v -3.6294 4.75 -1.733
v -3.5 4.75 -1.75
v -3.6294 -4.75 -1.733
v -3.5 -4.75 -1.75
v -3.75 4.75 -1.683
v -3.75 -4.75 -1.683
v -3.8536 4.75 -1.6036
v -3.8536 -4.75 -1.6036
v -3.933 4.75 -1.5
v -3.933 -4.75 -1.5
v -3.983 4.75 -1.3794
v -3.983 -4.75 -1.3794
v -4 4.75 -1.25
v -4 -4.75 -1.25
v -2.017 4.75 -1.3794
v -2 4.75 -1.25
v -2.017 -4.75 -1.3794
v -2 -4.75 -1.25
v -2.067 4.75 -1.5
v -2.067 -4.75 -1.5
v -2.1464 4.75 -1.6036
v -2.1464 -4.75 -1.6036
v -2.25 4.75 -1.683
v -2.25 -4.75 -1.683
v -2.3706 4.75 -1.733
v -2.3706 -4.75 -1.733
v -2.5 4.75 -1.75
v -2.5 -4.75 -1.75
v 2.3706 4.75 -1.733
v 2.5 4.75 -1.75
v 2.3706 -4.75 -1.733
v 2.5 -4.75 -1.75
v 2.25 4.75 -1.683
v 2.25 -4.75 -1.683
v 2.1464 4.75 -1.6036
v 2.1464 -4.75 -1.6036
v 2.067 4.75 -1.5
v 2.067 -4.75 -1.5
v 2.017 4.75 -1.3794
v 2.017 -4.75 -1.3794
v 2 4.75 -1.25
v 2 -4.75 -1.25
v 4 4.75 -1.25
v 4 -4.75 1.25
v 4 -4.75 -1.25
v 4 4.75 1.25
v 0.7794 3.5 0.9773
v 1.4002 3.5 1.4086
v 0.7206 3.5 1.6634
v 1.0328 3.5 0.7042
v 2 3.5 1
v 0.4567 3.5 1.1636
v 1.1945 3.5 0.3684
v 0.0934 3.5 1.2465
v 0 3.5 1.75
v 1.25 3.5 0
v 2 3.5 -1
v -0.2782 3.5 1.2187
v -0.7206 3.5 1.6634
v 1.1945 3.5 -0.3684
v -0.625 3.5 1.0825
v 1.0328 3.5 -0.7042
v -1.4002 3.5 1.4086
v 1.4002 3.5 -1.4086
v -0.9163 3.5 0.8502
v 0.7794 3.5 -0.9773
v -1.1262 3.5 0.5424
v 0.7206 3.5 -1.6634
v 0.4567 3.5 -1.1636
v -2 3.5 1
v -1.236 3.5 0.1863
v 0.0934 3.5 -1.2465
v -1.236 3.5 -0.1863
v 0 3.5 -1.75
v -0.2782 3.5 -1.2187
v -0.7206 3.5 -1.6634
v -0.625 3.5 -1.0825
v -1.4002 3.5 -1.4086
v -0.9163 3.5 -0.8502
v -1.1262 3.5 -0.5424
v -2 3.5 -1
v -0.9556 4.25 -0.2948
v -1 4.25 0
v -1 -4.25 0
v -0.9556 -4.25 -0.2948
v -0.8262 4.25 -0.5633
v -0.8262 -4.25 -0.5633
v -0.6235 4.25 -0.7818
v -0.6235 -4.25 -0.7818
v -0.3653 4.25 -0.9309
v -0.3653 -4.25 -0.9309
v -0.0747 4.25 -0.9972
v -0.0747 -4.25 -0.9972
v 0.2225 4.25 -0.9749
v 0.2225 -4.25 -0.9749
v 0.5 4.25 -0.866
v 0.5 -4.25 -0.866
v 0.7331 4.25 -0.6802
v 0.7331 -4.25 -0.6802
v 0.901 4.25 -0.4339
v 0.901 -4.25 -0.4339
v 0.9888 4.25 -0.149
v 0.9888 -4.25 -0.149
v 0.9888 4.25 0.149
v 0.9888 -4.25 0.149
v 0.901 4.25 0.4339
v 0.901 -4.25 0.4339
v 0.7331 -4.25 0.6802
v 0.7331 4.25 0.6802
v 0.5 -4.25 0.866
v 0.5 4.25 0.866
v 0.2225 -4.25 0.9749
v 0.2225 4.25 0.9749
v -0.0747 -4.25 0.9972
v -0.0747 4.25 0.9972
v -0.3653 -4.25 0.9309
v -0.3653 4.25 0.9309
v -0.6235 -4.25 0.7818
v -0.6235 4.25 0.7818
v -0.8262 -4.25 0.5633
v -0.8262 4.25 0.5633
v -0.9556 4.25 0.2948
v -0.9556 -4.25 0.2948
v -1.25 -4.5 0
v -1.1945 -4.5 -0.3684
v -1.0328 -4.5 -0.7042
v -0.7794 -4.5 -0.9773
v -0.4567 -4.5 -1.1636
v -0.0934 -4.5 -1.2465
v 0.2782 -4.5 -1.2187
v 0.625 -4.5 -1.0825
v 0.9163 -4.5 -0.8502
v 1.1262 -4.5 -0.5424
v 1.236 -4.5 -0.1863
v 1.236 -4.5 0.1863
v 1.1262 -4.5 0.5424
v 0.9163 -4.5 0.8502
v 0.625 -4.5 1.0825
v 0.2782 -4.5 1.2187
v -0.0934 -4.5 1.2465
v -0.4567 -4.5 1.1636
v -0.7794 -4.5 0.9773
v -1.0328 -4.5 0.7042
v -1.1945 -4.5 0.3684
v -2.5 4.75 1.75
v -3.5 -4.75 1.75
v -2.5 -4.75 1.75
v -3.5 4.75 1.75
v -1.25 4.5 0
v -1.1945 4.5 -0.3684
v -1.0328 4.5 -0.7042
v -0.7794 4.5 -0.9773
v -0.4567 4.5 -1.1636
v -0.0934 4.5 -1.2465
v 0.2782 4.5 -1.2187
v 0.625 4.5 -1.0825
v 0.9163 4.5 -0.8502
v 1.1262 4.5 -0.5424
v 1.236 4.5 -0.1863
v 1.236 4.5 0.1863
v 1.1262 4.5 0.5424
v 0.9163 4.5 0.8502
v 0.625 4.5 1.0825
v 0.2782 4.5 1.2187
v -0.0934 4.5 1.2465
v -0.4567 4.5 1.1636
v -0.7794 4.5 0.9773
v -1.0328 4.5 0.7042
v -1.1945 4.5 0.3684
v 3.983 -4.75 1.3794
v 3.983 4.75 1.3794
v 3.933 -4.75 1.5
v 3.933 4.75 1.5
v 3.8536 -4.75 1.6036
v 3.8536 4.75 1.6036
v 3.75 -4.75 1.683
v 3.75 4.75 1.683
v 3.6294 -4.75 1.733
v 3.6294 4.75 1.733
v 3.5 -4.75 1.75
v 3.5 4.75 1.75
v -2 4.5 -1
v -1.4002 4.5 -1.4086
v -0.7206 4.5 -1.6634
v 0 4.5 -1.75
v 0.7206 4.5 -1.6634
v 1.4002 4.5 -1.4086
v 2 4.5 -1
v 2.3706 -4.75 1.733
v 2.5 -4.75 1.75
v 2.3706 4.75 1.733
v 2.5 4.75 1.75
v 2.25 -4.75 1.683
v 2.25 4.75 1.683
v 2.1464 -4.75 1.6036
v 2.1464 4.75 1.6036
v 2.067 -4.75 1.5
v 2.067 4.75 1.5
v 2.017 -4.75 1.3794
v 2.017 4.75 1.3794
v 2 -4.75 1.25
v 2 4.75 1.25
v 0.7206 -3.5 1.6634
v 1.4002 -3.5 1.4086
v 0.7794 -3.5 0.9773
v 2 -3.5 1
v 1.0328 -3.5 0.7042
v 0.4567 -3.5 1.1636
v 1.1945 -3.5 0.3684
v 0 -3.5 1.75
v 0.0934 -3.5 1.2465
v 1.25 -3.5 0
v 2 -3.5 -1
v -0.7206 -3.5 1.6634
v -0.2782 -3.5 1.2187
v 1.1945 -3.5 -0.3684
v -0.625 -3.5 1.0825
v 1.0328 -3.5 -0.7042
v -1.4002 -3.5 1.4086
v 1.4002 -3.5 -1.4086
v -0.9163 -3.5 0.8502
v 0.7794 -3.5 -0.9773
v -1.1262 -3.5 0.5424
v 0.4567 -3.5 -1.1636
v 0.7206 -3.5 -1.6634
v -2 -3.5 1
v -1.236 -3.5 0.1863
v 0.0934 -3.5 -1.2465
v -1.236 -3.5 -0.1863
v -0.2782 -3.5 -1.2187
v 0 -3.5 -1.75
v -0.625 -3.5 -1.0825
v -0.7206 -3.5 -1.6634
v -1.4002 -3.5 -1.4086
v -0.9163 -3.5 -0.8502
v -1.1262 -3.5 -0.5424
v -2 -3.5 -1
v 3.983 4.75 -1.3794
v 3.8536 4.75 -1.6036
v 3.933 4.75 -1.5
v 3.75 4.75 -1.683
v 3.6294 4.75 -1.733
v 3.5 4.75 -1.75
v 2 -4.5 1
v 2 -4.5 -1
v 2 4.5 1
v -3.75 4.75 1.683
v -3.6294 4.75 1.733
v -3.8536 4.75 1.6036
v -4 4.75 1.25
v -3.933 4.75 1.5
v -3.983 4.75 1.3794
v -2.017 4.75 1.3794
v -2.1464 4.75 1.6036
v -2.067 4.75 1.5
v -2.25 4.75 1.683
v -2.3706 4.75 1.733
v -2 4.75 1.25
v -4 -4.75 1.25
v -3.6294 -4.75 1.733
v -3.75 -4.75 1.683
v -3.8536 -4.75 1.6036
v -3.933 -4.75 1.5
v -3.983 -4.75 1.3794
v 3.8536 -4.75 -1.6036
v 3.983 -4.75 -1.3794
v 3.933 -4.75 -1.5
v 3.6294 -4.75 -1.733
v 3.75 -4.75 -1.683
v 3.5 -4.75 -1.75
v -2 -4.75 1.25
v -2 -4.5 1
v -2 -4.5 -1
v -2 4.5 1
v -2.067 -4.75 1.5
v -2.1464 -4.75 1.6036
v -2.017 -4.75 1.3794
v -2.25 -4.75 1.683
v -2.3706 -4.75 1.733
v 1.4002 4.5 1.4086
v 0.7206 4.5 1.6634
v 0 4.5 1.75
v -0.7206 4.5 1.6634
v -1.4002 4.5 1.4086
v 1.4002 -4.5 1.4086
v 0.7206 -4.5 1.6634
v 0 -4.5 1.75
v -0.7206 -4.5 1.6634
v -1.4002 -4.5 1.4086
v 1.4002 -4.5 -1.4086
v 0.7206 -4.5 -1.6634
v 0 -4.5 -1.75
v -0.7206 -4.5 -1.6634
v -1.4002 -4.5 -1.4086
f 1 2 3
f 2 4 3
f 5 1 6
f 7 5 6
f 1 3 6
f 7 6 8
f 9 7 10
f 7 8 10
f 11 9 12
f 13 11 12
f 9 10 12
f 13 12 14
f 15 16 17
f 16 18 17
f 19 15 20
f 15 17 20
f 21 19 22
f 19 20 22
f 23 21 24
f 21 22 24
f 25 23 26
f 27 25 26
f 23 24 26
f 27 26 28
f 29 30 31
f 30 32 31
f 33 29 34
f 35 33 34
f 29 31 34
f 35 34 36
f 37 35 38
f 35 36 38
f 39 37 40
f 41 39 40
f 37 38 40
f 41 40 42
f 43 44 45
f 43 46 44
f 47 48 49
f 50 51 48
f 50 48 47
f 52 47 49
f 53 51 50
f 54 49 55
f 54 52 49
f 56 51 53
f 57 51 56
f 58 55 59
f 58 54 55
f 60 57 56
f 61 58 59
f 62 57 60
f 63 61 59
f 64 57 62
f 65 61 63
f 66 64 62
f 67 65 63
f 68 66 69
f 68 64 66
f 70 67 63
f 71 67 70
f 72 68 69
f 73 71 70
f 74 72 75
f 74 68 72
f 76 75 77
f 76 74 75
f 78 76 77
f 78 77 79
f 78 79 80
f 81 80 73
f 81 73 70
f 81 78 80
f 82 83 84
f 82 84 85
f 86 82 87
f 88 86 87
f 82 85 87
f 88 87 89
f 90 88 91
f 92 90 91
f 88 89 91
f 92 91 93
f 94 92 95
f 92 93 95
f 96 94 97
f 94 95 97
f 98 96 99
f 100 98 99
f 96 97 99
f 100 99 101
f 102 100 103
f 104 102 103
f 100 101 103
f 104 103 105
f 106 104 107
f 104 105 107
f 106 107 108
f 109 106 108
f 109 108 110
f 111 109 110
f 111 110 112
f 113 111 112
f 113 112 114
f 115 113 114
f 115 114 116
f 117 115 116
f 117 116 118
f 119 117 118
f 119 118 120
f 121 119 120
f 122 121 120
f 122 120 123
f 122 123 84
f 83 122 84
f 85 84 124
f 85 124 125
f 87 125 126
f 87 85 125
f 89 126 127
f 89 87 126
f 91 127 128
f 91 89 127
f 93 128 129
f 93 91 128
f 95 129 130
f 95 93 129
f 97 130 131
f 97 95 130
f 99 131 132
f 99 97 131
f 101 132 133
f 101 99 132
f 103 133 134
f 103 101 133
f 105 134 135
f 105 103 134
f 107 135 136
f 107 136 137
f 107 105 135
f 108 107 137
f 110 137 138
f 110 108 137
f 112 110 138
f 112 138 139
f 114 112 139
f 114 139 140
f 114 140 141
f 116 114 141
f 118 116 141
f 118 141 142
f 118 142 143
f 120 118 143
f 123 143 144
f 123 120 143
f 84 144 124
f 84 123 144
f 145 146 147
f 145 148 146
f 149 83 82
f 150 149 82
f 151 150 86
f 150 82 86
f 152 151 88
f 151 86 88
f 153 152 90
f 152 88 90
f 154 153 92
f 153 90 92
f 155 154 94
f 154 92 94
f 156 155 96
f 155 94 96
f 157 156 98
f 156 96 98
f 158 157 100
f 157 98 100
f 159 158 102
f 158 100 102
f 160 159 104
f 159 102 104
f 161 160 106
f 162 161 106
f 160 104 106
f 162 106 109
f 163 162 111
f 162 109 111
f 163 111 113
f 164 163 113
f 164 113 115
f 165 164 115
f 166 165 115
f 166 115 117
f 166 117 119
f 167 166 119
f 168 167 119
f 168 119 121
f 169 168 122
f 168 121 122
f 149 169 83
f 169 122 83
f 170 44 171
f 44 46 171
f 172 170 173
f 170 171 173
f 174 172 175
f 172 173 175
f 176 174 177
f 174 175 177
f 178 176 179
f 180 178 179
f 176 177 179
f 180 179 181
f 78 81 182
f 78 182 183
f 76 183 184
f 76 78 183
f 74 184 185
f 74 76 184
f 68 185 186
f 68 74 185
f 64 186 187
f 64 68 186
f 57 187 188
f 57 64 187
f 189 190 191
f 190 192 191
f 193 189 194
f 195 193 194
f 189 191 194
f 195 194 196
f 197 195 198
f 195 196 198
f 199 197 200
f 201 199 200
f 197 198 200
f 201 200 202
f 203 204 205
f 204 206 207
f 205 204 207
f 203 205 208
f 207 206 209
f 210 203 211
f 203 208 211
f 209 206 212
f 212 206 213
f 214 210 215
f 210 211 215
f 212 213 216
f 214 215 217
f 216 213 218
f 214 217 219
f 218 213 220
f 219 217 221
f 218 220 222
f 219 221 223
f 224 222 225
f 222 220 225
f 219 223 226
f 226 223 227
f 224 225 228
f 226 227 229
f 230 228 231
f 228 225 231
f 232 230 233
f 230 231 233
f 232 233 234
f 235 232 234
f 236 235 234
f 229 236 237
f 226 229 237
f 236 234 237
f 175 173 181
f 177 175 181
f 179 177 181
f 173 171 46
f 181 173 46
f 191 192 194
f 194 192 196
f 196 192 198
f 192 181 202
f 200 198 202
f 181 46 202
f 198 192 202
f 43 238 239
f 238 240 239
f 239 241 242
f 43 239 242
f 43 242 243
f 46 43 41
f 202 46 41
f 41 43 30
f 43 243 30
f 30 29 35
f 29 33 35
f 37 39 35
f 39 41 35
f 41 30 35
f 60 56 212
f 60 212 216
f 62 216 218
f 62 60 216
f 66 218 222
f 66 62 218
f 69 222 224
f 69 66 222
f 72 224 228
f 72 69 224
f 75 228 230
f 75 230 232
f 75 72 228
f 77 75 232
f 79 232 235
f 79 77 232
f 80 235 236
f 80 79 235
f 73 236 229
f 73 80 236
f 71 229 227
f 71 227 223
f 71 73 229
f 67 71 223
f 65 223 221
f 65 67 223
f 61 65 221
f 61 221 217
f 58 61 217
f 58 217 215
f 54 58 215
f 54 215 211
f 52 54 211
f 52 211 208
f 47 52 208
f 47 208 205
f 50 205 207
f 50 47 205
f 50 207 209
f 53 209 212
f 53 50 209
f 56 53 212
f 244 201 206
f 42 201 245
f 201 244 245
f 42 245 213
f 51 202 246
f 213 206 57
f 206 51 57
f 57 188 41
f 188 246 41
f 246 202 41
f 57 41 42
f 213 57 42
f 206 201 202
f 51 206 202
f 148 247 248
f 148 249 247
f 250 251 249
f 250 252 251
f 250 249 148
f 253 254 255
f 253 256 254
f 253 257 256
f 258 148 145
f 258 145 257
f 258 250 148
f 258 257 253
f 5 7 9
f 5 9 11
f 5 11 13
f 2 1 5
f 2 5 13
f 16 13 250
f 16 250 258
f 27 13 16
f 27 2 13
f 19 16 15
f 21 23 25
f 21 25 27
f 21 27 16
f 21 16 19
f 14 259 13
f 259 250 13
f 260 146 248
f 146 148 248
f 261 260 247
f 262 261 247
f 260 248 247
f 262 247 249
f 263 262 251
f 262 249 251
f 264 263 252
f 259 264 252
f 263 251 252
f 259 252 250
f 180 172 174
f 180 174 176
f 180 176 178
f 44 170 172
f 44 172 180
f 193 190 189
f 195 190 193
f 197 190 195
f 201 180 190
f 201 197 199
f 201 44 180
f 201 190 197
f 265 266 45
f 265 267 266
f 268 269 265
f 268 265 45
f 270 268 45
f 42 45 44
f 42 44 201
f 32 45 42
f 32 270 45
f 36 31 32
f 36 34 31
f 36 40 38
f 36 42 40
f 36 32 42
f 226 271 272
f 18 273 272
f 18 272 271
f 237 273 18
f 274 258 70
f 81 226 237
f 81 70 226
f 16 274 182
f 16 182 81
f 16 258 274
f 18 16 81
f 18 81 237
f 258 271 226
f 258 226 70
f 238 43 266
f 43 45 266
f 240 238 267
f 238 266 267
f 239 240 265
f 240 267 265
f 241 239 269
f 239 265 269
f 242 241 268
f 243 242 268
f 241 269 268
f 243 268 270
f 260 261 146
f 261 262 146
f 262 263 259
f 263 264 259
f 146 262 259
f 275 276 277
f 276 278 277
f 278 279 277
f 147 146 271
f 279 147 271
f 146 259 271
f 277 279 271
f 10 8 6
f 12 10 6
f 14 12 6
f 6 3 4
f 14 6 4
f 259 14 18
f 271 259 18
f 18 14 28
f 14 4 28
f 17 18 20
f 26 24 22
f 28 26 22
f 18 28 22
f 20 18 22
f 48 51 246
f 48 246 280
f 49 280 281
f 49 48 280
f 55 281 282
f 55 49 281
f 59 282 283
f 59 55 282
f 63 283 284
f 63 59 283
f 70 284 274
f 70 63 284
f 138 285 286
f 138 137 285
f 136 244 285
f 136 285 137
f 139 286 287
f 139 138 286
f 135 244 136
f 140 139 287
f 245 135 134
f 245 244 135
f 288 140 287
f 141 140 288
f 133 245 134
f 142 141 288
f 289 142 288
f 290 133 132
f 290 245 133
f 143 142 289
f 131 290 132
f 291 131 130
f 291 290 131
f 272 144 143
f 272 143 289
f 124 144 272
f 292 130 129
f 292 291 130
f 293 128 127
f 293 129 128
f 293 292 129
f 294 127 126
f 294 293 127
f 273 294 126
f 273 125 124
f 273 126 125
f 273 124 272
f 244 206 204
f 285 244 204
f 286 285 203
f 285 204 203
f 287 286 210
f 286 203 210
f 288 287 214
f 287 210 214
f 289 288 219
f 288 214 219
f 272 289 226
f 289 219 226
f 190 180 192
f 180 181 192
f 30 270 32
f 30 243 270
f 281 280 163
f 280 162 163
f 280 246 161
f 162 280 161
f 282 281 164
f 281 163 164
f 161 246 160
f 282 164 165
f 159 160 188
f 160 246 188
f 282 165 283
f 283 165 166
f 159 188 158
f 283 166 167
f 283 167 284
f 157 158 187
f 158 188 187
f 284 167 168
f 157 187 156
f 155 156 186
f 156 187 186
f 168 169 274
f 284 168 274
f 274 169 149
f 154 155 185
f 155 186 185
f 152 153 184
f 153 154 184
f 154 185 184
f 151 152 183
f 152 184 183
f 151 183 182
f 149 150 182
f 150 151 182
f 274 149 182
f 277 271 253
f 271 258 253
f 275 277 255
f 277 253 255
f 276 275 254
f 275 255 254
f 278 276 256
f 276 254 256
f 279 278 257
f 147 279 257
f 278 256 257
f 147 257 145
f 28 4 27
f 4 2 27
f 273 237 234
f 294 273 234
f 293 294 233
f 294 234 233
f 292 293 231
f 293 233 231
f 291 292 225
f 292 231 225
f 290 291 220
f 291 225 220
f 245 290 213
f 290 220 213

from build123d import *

# Parameters (mm, degrees)
SKETCH1_R             = 1.25
BOSS_EXTRUDE1_DEPTH   = 4.5
BOSS_EXTRUDE2_START   = -3.5
BOSS_EXTRUDE2_DEPTH   = 1
SKETCH3_W             = 2
SKETCH3_H             = 3.5
BOSS_EXTRUDE3_DEPTH   = 4.75
FILLET2_R             = 0.5
F_2_0MM_DOWEL_HOLE1_D = 2
CHAMFER1_SIZE         = 0.25


with BuildPart() as part:
    # Sketch1 → Boss-Extrude1 (new body, symmetric)
    with BuildSketch(Plane(origin=(0, 0, 0), x_dir=(1, 0, 0), z_dir=(0, 1, 0))):
        Circle(SKETCH1_R)
    extrude(amount=BOSS_EXTRUDE1_DEPTH, both=True)

    # Sketch2 → Boss-Extrude2 (add)
    with BuildSketch(Plane(origin=(0, 0, 0), x_dir=(1, 0, 0), z_dir=(0, 1, 0)).offset(BOSS_EXTRUDE2_START)):
        with BuildLine():
            Line((-2, -1), (-2, 1))
            ThreePointArc((-2, 1), (0, 1.75), (2, 1))
            Line((2, 1), (2, -1))
            ThreePointArc((2, -1), (0, -1.75), (-2, -1))
        make_face()
    boss_extrude2 = extrude(amount=-BOSS_EXTRUDE2_DEPTH)

    # Mirror2: Boss-Extrude2 across plane
    add(boss_extrude2.mirror(Plane.ZX))

    # Sketch3 → Boss-Extrude3 (add, symmetric)
    with BuildSketch(Plane(origin=(0, 0, 0), x_dir=(1, 0, 0), z_dir=(0, 1, 0))):
        with Locations((-3, 0)):
            Rectangle(SKETCH3_W, SKETCH3_H)
    boss_extrude3 = extrude(amount=BOSS_EXTRUDE3_DEPTH, both=True)

    # Mirror3: Boss-Extrude3 across plane
    add(boss_extrude3.mirror(Plane(origin=(0, 0, 0), x_dir=(0, 0, 1), z_dir=(1, 0, 0))))

    # Fillet2
    fillet2_edges = [part.edges().sort_by_distance(p)[0] for p in [
        (-2, 0, 1.75),
        (-4, 0, -1.75),
        (-4, 0, 1.75),
        (-2, 0, -1.75),
        (2, 0, -1.75),
        (4, 0, 1.75),
        (4, 0, -1.75),
        (2, 0, 1.75),
    ]]
    fillet(fillet2_edges, radius=FILLET2_R)

    # Ø2.0mm Dowel Hole1 (through all)
    with Locations(Plane(origin=(0, 4.5, 0), x_dir=(1, 0, 0), z_dir=(0, 1, 0))):
        with Locations((0, 0)):
            Hole(F_2_0MM_DOWEL_HOLE1_D / 2)

    # Chamfer1
    chamfer1_edges = [part.edges().sort_by_distance(p)[0] for p in [
        (1, -4.5, 0),
        (1, 4.5, 0),
    ]]
    chamfer(chamfer1_edges, length=CHAMFER1_SIZE)


solid = part.part
